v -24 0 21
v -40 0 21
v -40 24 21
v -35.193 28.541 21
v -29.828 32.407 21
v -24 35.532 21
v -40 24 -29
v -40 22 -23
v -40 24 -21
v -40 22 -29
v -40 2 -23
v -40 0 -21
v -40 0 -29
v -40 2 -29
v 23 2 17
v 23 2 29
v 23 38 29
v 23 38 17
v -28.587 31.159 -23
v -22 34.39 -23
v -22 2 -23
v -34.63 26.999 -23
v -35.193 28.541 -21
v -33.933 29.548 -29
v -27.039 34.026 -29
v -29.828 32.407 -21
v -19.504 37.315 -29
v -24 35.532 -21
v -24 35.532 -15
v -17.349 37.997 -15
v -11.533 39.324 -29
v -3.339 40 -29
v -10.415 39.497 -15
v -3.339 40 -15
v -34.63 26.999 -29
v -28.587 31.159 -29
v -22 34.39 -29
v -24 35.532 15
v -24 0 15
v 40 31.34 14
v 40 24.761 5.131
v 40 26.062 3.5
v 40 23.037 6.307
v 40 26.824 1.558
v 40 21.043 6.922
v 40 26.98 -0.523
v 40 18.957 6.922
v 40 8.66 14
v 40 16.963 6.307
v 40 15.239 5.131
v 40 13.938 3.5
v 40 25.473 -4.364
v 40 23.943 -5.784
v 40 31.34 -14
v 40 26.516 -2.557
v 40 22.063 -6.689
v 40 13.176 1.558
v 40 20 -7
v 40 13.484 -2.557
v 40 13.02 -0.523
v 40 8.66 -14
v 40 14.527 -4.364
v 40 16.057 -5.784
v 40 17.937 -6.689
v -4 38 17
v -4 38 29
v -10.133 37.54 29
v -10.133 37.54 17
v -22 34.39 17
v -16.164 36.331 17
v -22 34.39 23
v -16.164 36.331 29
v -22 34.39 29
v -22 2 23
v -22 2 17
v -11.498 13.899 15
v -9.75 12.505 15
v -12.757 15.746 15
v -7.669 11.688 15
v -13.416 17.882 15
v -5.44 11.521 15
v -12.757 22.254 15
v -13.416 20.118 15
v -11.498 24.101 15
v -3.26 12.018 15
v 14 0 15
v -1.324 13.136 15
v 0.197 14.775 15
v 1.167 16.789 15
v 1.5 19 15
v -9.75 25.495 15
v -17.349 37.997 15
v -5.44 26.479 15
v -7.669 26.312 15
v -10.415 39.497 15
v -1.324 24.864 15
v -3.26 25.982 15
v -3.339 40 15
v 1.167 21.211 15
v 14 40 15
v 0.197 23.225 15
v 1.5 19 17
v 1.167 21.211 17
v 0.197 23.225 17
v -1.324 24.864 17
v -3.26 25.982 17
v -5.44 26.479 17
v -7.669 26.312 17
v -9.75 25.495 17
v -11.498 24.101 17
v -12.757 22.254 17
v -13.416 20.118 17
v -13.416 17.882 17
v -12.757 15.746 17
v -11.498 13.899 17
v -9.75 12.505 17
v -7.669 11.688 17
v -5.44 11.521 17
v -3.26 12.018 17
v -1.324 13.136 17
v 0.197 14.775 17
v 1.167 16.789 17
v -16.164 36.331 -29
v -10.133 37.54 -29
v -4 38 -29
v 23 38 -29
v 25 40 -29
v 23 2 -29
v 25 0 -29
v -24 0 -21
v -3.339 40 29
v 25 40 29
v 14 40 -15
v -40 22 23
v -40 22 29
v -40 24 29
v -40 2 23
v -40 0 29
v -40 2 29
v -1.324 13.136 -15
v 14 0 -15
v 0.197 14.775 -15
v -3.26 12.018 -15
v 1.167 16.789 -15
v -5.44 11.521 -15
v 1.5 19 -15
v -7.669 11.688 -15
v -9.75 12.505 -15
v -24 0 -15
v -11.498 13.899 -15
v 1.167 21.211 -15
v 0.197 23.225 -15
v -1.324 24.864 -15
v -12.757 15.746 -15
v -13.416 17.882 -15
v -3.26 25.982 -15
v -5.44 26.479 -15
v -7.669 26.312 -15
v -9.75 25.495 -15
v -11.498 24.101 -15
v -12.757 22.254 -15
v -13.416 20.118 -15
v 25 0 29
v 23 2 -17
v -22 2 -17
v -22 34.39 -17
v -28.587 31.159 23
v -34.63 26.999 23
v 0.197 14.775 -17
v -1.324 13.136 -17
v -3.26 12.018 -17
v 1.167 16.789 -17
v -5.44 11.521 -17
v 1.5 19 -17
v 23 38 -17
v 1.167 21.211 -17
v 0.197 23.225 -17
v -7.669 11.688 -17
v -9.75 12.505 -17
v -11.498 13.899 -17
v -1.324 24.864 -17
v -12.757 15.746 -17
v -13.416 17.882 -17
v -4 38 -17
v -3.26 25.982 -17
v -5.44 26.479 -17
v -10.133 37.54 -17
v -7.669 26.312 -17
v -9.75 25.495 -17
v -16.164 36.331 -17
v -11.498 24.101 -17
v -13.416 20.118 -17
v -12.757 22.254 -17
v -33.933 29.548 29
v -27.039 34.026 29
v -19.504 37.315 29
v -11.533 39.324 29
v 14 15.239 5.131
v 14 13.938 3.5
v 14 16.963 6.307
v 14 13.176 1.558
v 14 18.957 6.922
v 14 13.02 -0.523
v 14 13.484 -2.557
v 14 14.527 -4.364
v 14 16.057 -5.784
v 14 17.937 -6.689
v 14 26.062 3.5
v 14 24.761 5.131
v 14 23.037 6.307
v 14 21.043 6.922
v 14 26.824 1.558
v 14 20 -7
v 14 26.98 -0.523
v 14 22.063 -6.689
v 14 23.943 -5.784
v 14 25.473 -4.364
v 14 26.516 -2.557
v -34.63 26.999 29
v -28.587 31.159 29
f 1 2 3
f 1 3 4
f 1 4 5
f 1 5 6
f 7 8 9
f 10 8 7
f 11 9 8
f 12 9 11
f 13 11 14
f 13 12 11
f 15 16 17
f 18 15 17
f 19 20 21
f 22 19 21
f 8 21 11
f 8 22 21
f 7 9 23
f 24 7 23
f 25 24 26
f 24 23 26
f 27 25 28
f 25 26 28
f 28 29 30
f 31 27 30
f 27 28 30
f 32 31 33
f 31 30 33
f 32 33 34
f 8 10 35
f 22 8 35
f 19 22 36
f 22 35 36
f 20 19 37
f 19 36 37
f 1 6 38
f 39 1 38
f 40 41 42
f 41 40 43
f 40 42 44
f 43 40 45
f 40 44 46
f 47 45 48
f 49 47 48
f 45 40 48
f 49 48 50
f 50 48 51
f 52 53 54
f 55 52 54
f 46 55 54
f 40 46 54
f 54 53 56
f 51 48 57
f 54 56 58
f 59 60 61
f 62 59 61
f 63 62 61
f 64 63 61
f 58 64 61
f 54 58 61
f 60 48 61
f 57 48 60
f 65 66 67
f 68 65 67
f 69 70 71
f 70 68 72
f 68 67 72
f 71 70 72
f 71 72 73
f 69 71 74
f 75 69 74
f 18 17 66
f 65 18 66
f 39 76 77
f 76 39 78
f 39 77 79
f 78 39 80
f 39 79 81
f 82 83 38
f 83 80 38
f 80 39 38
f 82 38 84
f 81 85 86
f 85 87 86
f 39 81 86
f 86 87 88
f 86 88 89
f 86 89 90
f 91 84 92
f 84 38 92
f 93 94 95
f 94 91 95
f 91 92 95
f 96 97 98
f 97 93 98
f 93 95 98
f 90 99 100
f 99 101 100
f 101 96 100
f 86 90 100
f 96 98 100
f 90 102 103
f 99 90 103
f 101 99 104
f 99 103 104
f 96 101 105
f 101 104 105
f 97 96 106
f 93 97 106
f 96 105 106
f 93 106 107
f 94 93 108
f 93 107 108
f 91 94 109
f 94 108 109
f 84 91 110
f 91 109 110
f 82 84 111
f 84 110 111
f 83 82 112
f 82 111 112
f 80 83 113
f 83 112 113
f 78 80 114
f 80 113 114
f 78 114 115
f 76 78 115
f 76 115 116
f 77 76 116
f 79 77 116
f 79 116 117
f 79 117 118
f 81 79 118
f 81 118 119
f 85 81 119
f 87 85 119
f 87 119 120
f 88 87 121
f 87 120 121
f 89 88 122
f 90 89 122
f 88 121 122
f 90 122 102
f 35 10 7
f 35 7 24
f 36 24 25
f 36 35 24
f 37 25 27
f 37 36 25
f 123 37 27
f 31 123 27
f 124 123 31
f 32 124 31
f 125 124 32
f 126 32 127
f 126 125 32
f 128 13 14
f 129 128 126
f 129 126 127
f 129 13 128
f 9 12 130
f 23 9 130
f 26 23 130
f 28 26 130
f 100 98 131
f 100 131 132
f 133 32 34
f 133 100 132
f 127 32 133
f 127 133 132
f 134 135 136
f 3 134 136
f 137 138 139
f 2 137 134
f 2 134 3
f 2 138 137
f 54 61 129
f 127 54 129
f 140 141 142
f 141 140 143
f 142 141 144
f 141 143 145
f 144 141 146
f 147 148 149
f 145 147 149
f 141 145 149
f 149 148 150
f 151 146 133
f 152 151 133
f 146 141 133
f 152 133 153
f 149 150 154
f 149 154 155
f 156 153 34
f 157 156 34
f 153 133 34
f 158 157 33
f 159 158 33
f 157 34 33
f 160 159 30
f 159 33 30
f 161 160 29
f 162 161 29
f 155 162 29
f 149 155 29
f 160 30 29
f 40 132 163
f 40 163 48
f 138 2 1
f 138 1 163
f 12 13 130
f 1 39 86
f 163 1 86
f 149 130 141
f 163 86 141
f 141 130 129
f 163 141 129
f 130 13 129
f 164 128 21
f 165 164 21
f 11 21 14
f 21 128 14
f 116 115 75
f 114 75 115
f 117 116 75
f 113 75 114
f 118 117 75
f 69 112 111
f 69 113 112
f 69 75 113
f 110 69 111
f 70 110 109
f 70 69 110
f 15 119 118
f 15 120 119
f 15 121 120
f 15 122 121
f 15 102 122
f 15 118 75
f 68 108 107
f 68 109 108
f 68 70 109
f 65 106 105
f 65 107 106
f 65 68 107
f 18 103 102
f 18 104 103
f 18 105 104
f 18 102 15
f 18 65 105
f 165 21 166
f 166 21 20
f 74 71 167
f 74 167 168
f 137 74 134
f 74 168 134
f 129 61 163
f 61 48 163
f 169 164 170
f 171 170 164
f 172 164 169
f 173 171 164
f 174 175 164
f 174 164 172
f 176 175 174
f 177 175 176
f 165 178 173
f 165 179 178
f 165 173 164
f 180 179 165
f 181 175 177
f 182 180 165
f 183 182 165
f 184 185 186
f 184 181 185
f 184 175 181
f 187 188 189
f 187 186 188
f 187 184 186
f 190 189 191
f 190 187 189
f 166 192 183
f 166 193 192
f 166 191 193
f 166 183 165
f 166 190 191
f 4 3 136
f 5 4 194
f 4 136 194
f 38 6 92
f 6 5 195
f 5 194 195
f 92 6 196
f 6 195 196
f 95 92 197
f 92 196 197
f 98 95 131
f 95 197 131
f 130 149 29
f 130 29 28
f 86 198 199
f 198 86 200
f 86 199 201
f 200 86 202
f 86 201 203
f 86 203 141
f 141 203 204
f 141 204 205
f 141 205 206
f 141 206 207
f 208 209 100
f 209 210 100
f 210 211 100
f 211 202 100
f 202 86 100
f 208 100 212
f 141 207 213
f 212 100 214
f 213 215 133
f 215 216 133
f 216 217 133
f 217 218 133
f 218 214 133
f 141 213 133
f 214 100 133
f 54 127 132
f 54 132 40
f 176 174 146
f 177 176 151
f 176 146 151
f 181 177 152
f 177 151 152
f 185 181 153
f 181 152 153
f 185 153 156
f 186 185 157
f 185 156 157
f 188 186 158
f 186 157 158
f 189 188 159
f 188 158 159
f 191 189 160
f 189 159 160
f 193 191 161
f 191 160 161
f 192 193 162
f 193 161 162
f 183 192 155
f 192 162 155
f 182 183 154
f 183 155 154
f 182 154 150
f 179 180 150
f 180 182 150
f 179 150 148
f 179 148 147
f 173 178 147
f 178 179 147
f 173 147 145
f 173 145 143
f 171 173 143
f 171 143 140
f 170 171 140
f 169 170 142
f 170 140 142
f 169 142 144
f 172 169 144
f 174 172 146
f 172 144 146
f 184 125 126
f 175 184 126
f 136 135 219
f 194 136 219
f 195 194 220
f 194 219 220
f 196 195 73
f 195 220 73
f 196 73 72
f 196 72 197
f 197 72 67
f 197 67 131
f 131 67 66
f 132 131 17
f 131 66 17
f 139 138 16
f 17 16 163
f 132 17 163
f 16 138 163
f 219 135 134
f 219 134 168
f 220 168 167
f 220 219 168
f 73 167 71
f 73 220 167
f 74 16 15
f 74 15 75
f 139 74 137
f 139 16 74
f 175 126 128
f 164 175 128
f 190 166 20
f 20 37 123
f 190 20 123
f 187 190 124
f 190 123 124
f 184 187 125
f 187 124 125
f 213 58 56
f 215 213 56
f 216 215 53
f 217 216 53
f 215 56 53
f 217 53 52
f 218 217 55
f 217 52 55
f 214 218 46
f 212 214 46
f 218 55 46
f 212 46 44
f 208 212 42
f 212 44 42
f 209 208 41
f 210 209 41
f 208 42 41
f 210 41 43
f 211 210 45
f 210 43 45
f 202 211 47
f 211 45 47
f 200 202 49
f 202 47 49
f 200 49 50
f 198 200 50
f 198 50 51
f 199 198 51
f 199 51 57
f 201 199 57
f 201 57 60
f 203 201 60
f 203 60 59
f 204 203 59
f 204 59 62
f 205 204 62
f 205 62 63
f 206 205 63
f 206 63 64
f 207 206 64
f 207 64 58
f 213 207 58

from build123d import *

# Parameters (mm, degrees)
SKETCH2_W                = 80
SKETCH2_H                = 58
BOSS_EXTRUDE1_DEPTH      = 40
CUT_EXTRUDE7_DEPTH       = 58
CUT_EXTRUDE7_DEPTH_BACK  = 58
SKETCH4_R                = 7.5
SKETCH12_W               = 54
SKETCH12_H               = 30
CUT_EXTRUDE10_DEPTH      = 58
CUT_EXTRUDE11_DEPTH      = 58
CUT_EXTRUDE11_DEPTH_BACK = 58
SKETCH14_W               = 16
SKETCH14_H               = 6
CUT_EXTRUDE12_DEPTH      = 58
CUT_EXTRUDE12_DEPTH_BACK = 58
SKETCH17_R               = 7
CUT_EXTRUDE14_DEPTH      = 58
CUT_EXTRUDE14_DEPTH_BACK = 58
SKETCH20_R               = 7.5
CUT_EXTRUDE15_DEPTH      = 12
CUT_EXTRUDE16_DEPTH      = 6
CUT_EXTRUDE17_START      = -12
SKETCH23_R               = 7.5
CUT_EXTRUDE17_DEPTH      = 12
CUT_EXTRUDE18_START      = -6
CUT_EXTRUDE18_DEPTH      = 6


with BuildPart() as part:
    # Sketch2 → Boss-Extrude1 (new body)
    with BuildSketch(Plane(origin=(0, 0, 0), x_dir=(1, 0, 0), z_dir=(0, 1, 0))):
        Rectangle(SKETCH2_W, SKETCH2_H)
    extrude(amount=BOSS_EXTRUDE1_DEPTH)

    # Sketch4 → Cut-Extrude7 (cut, two sides: drawn at the far end of the back side and taken through both)
    with BuildSketch(Plane.XY.offset(-CUT_EXTRUDE7_DEPTH_BACK)):
        Polygon((25, 0), (40, 0), (40, 8.660254038), align=None)
        Polygon((25, 40), (40, 31.339745962), (40, 40), align=None)
        with BuildLine():
            Line((-40, 40), (-40, 24))
            ThreePointArc((-40, 24), (-23.33939444, 35.82575695), (-3.33939444, 40))
            Line((-3.33939444, 40), (-40, 40))
        make_face()
        with Locations((-6, 19)):
            Circle(SKETCH4_R)
    extrude(amount=CUT_EXTRUDE7_DEPTH + CUT_EXTRUDE7_DEPTH_BACK, mode=Mode.SUBTRACT)

    # Sketch12 → Cut-Extrude10 (cut)
    with BuildSketch(Plane(origin=(0, 40, 0), x_dir=(1, 0, 0), z_dir=(0, 1, 0))):
        with Locations((-13, 0)):
            Rectangle(SKETCH12_W, SKETCH12_H)
    extrude(amount=-CUT_EXTRUDE10_DEPTH, mode=Mode.SUBTRACT)

    # Sketch14 → Cut-Extrude11 (cut, two sides: drawn at the far end of the back side and taken through both)
    with BuildSketch(Plane(origin=(0, 40, 0), x_dir=(1, 0, 0), z_dir=(0, 1, 0)).offset(-CUT_EXTRUDE11_DEPTH_BACK)):
        with Locations((-32, 18)):
            Rectangle(SKETCH14_W, SKETCH14_H)
        with Locations((-32, -18)):
            Rectangle(SKETCH14_W, SKETCH14_H)
    extrude(amount=CUT_EXTRUDE11_DEPTH + CUT_EXTRUDE11_DEPTH_BACK, mode=Mode.SUBTRACT)

    # Sketch17 → Cut-Extrude12 (cut, two sides: drawn at the far end of the back side and taken through both)
    with BuildSketch(Plane(origin=(40, 0, 0), x_dir=(0, 0, -1), z_dir=(1, 0, 0)).offset(-CUT_EXTRUDE12_DEPTH_BACK)):
        with Locations((0, 20)):
            Circle(SKETCH17_R)
    extrude(amount=CUT_EXTRUDE12_DEPTH + CUT_EXTRUDE12_DEPTH_BACK, mode=Mode.SUBTRACT)

    # Sketch19 → Cut-Extrude14 (cut, two sides: drawn at the far end of the back side and taken through both)
    with BuildSketch(Plane(origin=(0, 40, 0), x_dir=(1, 0, 0), z_dir=(0, 1, 0)).offset(-CUT_EXTRUDE14_DEPTH_BACK)):
        Polygon((25, 29), (40, 29), (40, 14), align=None)
        Polygon((25, -29), (40, -14), (40, -29), align=None)
    extrude(amount=CUT_EXTRUDE14_DEPTH + CUT_EXTRUDE14_DEPTH_BACK, mode=Mode.SUBTRACT)

    # Sketch20 → Cut-Extrude15 (cut)
    with BuildSketch(Plane.XY.offset(29)):
        with BuildLine():
            Line((23, 2), (23, 38))
            Line((23, 38), (-4, 38))
            ThreePointArc((-4, 38), (-13.167101456, 37.028245592), (-22, 34.39007216))
            Line((-22, 34.39007216), (-22, 2))
            Line((-22, 2), (23, 2))
        make_face()
        with Locations((-6, 19)):
            Circle(SKETCH20_R, mode=Mode.SUBTRACT)
    extrude(amount=-CUT_EXTRUDE15_DEPTH, mode=Mode.SUBTRACT)

    # Sketch22 → Cut-Extrude16 (cut)
    with BuildSketch(Plane.XY.offset(29)):
        with BuildLine():
            Line((-22, 2), (-40, 2))
            Line((-40, 2), (-40, 22))
            ThreePointArc((-40, 22), (-31.685151748, 29.190408126), (-22, 34.39007216))
            Line((-22, 34.39007216), (-22, 2))
        make_face()
    extrude(amount=-CUT_EXTRUDE16_DEPTH, mode=Mode.SUBTRACT)

    # Sketch23 → Cut-Extrude17 (cut)
    with BuildSketch(Plane(origin=(0, 0, -29), x_dir=(-1, 0, 0), z_dir=(0, 0, -1)).offset(CUT_EXTRUDE17_START)):
        with BuildLine():
            Line((4, 38), (-23, 38))
            Line((-23, 38), (-23, 2))
            Line((-23, 2), (22, 2))
            Line((22, 2), (22, 34.39007216))
            ThreePointArc((22, 34.39007216), (13.167101456, 37.028245592), (4, 38))
        make_face()
        with Locations((6, 19)):
            Circle(SKETCH23_R, mode=Mode.SUBTRACT)
    extrude(amount=CUT_EXTRUDE17_DEPTH, mode=Mode.SUBTRACT)

    # Sketch24 → Cut-Extrude18 (cut)
    with BuildSketch(Plane(origin=(0, 0, -29), x_dir=(-1, 0, 0), z_dir=(0, 0, -1)).offset(CUT_EXTRUDE18_START)):
        with BuildLine():
            Line((22, 2), (40, 2))
            Line((40, 2), (40, 22))
            ThreePointArc((40, 22), (31.685151748, 29.190408126), (22, 34.39007216))
            Line((22, 34.39007216), (22, 2))
        make_face()
    extrude(amount=CUT_EXTRUDE18_DEPTH, mode=Mode.SUBTRACT)


solid = part.part
